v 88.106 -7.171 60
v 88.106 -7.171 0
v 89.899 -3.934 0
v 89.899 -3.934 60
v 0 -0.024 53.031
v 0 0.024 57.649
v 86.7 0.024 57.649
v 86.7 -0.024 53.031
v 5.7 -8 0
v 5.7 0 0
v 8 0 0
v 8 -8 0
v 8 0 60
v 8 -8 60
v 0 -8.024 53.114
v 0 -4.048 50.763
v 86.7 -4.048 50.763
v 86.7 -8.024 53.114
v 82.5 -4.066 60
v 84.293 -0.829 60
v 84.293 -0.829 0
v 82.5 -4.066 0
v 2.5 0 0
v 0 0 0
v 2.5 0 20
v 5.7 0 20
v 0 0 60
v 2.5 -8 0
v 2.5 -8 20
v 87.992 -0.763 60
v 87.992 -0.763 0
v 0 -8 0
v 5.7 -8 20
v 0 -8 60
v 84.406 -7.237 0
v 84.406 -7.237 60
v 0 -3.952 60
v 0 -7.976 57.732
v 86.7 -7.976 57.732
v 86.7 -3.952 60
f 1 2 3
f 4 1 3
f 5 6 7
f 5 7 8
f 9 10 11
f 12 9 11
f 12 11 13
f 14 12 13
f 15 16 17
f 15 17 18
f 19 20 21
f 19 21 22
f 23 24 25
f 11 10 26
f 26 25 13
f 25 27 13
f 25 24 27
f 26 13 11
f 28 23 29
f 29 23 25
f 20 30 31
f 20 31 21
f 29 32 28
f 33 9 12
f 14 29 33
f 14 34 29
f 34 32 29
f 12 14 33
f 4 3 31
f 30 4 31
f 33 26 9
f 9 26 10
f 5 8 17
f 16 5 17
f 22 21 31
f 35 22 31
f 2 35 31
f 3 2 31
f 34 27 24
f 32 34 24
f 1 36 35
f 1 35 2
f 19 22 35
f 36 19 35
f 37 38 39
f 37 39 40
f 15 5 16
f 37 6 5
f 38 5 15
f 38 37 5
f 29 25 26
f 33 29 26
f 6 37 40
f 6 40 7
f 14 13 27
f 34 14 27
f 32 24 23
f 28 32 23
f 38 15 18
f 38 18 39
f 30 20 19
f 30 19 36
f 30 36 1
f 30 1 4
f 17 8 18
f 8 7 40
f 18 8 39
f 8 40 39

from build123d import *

# Parameters (mm, degrees)
F1_DEPTH = 8
F3_DEPTH = 60
F5_DEPTH = 86.7


with BuildPart() as f1:
    # F0 (on Front) → F1 (new body)
    with BuildSketch(Plane.XZ):
        Polygon((0, 60), (0, 0), (2.5, 0), (2.5, 20), (5.7, 20), (5.7, 0), (8, 0), (8, 60), align=None)
    extrude(amount=F1_DEPTH)


with BuildPart() as f3:
    # F2 (on Top) → F3 (new body)
    with BuildSketch(Plane.XY):
        Polygon((87.992338, -0.763422), (84.292919, -0.828997), (82.5, -4.065575), (84.406499, -7.236578), (88.105918, -7.171003), (89.898838, -3.934425), align=None)
    extrude(amount=F3_DEPTH)


with BuildPart() as f5:
    # F4 (on face) → F5 (new body)
    with BuildSketch(Plane(origin=(0, 0, 0), x_dir=(0, -1, 0), z_dir=(-1, 0, 0))):
        Polygon((4.048045, 50.762895), (8.023806, 53.113779), (7.975761, 57.732332), (3.951955, 60), (-0.023806, 57.649116), (0.024239, 53.030564), align=None)
        Polygon((4.048045, 50.762895), (8, 53.099703), (8, 55.402252), (7.975761, 57.732332), (3.951955, 60), (0, 57.663193), (0, 55.360643), (0.024239, 53.030564), align=None)
    extrude(amount=-F5_DEPTH)


solid = Compound([f1.part, f3.part, f5.part])
